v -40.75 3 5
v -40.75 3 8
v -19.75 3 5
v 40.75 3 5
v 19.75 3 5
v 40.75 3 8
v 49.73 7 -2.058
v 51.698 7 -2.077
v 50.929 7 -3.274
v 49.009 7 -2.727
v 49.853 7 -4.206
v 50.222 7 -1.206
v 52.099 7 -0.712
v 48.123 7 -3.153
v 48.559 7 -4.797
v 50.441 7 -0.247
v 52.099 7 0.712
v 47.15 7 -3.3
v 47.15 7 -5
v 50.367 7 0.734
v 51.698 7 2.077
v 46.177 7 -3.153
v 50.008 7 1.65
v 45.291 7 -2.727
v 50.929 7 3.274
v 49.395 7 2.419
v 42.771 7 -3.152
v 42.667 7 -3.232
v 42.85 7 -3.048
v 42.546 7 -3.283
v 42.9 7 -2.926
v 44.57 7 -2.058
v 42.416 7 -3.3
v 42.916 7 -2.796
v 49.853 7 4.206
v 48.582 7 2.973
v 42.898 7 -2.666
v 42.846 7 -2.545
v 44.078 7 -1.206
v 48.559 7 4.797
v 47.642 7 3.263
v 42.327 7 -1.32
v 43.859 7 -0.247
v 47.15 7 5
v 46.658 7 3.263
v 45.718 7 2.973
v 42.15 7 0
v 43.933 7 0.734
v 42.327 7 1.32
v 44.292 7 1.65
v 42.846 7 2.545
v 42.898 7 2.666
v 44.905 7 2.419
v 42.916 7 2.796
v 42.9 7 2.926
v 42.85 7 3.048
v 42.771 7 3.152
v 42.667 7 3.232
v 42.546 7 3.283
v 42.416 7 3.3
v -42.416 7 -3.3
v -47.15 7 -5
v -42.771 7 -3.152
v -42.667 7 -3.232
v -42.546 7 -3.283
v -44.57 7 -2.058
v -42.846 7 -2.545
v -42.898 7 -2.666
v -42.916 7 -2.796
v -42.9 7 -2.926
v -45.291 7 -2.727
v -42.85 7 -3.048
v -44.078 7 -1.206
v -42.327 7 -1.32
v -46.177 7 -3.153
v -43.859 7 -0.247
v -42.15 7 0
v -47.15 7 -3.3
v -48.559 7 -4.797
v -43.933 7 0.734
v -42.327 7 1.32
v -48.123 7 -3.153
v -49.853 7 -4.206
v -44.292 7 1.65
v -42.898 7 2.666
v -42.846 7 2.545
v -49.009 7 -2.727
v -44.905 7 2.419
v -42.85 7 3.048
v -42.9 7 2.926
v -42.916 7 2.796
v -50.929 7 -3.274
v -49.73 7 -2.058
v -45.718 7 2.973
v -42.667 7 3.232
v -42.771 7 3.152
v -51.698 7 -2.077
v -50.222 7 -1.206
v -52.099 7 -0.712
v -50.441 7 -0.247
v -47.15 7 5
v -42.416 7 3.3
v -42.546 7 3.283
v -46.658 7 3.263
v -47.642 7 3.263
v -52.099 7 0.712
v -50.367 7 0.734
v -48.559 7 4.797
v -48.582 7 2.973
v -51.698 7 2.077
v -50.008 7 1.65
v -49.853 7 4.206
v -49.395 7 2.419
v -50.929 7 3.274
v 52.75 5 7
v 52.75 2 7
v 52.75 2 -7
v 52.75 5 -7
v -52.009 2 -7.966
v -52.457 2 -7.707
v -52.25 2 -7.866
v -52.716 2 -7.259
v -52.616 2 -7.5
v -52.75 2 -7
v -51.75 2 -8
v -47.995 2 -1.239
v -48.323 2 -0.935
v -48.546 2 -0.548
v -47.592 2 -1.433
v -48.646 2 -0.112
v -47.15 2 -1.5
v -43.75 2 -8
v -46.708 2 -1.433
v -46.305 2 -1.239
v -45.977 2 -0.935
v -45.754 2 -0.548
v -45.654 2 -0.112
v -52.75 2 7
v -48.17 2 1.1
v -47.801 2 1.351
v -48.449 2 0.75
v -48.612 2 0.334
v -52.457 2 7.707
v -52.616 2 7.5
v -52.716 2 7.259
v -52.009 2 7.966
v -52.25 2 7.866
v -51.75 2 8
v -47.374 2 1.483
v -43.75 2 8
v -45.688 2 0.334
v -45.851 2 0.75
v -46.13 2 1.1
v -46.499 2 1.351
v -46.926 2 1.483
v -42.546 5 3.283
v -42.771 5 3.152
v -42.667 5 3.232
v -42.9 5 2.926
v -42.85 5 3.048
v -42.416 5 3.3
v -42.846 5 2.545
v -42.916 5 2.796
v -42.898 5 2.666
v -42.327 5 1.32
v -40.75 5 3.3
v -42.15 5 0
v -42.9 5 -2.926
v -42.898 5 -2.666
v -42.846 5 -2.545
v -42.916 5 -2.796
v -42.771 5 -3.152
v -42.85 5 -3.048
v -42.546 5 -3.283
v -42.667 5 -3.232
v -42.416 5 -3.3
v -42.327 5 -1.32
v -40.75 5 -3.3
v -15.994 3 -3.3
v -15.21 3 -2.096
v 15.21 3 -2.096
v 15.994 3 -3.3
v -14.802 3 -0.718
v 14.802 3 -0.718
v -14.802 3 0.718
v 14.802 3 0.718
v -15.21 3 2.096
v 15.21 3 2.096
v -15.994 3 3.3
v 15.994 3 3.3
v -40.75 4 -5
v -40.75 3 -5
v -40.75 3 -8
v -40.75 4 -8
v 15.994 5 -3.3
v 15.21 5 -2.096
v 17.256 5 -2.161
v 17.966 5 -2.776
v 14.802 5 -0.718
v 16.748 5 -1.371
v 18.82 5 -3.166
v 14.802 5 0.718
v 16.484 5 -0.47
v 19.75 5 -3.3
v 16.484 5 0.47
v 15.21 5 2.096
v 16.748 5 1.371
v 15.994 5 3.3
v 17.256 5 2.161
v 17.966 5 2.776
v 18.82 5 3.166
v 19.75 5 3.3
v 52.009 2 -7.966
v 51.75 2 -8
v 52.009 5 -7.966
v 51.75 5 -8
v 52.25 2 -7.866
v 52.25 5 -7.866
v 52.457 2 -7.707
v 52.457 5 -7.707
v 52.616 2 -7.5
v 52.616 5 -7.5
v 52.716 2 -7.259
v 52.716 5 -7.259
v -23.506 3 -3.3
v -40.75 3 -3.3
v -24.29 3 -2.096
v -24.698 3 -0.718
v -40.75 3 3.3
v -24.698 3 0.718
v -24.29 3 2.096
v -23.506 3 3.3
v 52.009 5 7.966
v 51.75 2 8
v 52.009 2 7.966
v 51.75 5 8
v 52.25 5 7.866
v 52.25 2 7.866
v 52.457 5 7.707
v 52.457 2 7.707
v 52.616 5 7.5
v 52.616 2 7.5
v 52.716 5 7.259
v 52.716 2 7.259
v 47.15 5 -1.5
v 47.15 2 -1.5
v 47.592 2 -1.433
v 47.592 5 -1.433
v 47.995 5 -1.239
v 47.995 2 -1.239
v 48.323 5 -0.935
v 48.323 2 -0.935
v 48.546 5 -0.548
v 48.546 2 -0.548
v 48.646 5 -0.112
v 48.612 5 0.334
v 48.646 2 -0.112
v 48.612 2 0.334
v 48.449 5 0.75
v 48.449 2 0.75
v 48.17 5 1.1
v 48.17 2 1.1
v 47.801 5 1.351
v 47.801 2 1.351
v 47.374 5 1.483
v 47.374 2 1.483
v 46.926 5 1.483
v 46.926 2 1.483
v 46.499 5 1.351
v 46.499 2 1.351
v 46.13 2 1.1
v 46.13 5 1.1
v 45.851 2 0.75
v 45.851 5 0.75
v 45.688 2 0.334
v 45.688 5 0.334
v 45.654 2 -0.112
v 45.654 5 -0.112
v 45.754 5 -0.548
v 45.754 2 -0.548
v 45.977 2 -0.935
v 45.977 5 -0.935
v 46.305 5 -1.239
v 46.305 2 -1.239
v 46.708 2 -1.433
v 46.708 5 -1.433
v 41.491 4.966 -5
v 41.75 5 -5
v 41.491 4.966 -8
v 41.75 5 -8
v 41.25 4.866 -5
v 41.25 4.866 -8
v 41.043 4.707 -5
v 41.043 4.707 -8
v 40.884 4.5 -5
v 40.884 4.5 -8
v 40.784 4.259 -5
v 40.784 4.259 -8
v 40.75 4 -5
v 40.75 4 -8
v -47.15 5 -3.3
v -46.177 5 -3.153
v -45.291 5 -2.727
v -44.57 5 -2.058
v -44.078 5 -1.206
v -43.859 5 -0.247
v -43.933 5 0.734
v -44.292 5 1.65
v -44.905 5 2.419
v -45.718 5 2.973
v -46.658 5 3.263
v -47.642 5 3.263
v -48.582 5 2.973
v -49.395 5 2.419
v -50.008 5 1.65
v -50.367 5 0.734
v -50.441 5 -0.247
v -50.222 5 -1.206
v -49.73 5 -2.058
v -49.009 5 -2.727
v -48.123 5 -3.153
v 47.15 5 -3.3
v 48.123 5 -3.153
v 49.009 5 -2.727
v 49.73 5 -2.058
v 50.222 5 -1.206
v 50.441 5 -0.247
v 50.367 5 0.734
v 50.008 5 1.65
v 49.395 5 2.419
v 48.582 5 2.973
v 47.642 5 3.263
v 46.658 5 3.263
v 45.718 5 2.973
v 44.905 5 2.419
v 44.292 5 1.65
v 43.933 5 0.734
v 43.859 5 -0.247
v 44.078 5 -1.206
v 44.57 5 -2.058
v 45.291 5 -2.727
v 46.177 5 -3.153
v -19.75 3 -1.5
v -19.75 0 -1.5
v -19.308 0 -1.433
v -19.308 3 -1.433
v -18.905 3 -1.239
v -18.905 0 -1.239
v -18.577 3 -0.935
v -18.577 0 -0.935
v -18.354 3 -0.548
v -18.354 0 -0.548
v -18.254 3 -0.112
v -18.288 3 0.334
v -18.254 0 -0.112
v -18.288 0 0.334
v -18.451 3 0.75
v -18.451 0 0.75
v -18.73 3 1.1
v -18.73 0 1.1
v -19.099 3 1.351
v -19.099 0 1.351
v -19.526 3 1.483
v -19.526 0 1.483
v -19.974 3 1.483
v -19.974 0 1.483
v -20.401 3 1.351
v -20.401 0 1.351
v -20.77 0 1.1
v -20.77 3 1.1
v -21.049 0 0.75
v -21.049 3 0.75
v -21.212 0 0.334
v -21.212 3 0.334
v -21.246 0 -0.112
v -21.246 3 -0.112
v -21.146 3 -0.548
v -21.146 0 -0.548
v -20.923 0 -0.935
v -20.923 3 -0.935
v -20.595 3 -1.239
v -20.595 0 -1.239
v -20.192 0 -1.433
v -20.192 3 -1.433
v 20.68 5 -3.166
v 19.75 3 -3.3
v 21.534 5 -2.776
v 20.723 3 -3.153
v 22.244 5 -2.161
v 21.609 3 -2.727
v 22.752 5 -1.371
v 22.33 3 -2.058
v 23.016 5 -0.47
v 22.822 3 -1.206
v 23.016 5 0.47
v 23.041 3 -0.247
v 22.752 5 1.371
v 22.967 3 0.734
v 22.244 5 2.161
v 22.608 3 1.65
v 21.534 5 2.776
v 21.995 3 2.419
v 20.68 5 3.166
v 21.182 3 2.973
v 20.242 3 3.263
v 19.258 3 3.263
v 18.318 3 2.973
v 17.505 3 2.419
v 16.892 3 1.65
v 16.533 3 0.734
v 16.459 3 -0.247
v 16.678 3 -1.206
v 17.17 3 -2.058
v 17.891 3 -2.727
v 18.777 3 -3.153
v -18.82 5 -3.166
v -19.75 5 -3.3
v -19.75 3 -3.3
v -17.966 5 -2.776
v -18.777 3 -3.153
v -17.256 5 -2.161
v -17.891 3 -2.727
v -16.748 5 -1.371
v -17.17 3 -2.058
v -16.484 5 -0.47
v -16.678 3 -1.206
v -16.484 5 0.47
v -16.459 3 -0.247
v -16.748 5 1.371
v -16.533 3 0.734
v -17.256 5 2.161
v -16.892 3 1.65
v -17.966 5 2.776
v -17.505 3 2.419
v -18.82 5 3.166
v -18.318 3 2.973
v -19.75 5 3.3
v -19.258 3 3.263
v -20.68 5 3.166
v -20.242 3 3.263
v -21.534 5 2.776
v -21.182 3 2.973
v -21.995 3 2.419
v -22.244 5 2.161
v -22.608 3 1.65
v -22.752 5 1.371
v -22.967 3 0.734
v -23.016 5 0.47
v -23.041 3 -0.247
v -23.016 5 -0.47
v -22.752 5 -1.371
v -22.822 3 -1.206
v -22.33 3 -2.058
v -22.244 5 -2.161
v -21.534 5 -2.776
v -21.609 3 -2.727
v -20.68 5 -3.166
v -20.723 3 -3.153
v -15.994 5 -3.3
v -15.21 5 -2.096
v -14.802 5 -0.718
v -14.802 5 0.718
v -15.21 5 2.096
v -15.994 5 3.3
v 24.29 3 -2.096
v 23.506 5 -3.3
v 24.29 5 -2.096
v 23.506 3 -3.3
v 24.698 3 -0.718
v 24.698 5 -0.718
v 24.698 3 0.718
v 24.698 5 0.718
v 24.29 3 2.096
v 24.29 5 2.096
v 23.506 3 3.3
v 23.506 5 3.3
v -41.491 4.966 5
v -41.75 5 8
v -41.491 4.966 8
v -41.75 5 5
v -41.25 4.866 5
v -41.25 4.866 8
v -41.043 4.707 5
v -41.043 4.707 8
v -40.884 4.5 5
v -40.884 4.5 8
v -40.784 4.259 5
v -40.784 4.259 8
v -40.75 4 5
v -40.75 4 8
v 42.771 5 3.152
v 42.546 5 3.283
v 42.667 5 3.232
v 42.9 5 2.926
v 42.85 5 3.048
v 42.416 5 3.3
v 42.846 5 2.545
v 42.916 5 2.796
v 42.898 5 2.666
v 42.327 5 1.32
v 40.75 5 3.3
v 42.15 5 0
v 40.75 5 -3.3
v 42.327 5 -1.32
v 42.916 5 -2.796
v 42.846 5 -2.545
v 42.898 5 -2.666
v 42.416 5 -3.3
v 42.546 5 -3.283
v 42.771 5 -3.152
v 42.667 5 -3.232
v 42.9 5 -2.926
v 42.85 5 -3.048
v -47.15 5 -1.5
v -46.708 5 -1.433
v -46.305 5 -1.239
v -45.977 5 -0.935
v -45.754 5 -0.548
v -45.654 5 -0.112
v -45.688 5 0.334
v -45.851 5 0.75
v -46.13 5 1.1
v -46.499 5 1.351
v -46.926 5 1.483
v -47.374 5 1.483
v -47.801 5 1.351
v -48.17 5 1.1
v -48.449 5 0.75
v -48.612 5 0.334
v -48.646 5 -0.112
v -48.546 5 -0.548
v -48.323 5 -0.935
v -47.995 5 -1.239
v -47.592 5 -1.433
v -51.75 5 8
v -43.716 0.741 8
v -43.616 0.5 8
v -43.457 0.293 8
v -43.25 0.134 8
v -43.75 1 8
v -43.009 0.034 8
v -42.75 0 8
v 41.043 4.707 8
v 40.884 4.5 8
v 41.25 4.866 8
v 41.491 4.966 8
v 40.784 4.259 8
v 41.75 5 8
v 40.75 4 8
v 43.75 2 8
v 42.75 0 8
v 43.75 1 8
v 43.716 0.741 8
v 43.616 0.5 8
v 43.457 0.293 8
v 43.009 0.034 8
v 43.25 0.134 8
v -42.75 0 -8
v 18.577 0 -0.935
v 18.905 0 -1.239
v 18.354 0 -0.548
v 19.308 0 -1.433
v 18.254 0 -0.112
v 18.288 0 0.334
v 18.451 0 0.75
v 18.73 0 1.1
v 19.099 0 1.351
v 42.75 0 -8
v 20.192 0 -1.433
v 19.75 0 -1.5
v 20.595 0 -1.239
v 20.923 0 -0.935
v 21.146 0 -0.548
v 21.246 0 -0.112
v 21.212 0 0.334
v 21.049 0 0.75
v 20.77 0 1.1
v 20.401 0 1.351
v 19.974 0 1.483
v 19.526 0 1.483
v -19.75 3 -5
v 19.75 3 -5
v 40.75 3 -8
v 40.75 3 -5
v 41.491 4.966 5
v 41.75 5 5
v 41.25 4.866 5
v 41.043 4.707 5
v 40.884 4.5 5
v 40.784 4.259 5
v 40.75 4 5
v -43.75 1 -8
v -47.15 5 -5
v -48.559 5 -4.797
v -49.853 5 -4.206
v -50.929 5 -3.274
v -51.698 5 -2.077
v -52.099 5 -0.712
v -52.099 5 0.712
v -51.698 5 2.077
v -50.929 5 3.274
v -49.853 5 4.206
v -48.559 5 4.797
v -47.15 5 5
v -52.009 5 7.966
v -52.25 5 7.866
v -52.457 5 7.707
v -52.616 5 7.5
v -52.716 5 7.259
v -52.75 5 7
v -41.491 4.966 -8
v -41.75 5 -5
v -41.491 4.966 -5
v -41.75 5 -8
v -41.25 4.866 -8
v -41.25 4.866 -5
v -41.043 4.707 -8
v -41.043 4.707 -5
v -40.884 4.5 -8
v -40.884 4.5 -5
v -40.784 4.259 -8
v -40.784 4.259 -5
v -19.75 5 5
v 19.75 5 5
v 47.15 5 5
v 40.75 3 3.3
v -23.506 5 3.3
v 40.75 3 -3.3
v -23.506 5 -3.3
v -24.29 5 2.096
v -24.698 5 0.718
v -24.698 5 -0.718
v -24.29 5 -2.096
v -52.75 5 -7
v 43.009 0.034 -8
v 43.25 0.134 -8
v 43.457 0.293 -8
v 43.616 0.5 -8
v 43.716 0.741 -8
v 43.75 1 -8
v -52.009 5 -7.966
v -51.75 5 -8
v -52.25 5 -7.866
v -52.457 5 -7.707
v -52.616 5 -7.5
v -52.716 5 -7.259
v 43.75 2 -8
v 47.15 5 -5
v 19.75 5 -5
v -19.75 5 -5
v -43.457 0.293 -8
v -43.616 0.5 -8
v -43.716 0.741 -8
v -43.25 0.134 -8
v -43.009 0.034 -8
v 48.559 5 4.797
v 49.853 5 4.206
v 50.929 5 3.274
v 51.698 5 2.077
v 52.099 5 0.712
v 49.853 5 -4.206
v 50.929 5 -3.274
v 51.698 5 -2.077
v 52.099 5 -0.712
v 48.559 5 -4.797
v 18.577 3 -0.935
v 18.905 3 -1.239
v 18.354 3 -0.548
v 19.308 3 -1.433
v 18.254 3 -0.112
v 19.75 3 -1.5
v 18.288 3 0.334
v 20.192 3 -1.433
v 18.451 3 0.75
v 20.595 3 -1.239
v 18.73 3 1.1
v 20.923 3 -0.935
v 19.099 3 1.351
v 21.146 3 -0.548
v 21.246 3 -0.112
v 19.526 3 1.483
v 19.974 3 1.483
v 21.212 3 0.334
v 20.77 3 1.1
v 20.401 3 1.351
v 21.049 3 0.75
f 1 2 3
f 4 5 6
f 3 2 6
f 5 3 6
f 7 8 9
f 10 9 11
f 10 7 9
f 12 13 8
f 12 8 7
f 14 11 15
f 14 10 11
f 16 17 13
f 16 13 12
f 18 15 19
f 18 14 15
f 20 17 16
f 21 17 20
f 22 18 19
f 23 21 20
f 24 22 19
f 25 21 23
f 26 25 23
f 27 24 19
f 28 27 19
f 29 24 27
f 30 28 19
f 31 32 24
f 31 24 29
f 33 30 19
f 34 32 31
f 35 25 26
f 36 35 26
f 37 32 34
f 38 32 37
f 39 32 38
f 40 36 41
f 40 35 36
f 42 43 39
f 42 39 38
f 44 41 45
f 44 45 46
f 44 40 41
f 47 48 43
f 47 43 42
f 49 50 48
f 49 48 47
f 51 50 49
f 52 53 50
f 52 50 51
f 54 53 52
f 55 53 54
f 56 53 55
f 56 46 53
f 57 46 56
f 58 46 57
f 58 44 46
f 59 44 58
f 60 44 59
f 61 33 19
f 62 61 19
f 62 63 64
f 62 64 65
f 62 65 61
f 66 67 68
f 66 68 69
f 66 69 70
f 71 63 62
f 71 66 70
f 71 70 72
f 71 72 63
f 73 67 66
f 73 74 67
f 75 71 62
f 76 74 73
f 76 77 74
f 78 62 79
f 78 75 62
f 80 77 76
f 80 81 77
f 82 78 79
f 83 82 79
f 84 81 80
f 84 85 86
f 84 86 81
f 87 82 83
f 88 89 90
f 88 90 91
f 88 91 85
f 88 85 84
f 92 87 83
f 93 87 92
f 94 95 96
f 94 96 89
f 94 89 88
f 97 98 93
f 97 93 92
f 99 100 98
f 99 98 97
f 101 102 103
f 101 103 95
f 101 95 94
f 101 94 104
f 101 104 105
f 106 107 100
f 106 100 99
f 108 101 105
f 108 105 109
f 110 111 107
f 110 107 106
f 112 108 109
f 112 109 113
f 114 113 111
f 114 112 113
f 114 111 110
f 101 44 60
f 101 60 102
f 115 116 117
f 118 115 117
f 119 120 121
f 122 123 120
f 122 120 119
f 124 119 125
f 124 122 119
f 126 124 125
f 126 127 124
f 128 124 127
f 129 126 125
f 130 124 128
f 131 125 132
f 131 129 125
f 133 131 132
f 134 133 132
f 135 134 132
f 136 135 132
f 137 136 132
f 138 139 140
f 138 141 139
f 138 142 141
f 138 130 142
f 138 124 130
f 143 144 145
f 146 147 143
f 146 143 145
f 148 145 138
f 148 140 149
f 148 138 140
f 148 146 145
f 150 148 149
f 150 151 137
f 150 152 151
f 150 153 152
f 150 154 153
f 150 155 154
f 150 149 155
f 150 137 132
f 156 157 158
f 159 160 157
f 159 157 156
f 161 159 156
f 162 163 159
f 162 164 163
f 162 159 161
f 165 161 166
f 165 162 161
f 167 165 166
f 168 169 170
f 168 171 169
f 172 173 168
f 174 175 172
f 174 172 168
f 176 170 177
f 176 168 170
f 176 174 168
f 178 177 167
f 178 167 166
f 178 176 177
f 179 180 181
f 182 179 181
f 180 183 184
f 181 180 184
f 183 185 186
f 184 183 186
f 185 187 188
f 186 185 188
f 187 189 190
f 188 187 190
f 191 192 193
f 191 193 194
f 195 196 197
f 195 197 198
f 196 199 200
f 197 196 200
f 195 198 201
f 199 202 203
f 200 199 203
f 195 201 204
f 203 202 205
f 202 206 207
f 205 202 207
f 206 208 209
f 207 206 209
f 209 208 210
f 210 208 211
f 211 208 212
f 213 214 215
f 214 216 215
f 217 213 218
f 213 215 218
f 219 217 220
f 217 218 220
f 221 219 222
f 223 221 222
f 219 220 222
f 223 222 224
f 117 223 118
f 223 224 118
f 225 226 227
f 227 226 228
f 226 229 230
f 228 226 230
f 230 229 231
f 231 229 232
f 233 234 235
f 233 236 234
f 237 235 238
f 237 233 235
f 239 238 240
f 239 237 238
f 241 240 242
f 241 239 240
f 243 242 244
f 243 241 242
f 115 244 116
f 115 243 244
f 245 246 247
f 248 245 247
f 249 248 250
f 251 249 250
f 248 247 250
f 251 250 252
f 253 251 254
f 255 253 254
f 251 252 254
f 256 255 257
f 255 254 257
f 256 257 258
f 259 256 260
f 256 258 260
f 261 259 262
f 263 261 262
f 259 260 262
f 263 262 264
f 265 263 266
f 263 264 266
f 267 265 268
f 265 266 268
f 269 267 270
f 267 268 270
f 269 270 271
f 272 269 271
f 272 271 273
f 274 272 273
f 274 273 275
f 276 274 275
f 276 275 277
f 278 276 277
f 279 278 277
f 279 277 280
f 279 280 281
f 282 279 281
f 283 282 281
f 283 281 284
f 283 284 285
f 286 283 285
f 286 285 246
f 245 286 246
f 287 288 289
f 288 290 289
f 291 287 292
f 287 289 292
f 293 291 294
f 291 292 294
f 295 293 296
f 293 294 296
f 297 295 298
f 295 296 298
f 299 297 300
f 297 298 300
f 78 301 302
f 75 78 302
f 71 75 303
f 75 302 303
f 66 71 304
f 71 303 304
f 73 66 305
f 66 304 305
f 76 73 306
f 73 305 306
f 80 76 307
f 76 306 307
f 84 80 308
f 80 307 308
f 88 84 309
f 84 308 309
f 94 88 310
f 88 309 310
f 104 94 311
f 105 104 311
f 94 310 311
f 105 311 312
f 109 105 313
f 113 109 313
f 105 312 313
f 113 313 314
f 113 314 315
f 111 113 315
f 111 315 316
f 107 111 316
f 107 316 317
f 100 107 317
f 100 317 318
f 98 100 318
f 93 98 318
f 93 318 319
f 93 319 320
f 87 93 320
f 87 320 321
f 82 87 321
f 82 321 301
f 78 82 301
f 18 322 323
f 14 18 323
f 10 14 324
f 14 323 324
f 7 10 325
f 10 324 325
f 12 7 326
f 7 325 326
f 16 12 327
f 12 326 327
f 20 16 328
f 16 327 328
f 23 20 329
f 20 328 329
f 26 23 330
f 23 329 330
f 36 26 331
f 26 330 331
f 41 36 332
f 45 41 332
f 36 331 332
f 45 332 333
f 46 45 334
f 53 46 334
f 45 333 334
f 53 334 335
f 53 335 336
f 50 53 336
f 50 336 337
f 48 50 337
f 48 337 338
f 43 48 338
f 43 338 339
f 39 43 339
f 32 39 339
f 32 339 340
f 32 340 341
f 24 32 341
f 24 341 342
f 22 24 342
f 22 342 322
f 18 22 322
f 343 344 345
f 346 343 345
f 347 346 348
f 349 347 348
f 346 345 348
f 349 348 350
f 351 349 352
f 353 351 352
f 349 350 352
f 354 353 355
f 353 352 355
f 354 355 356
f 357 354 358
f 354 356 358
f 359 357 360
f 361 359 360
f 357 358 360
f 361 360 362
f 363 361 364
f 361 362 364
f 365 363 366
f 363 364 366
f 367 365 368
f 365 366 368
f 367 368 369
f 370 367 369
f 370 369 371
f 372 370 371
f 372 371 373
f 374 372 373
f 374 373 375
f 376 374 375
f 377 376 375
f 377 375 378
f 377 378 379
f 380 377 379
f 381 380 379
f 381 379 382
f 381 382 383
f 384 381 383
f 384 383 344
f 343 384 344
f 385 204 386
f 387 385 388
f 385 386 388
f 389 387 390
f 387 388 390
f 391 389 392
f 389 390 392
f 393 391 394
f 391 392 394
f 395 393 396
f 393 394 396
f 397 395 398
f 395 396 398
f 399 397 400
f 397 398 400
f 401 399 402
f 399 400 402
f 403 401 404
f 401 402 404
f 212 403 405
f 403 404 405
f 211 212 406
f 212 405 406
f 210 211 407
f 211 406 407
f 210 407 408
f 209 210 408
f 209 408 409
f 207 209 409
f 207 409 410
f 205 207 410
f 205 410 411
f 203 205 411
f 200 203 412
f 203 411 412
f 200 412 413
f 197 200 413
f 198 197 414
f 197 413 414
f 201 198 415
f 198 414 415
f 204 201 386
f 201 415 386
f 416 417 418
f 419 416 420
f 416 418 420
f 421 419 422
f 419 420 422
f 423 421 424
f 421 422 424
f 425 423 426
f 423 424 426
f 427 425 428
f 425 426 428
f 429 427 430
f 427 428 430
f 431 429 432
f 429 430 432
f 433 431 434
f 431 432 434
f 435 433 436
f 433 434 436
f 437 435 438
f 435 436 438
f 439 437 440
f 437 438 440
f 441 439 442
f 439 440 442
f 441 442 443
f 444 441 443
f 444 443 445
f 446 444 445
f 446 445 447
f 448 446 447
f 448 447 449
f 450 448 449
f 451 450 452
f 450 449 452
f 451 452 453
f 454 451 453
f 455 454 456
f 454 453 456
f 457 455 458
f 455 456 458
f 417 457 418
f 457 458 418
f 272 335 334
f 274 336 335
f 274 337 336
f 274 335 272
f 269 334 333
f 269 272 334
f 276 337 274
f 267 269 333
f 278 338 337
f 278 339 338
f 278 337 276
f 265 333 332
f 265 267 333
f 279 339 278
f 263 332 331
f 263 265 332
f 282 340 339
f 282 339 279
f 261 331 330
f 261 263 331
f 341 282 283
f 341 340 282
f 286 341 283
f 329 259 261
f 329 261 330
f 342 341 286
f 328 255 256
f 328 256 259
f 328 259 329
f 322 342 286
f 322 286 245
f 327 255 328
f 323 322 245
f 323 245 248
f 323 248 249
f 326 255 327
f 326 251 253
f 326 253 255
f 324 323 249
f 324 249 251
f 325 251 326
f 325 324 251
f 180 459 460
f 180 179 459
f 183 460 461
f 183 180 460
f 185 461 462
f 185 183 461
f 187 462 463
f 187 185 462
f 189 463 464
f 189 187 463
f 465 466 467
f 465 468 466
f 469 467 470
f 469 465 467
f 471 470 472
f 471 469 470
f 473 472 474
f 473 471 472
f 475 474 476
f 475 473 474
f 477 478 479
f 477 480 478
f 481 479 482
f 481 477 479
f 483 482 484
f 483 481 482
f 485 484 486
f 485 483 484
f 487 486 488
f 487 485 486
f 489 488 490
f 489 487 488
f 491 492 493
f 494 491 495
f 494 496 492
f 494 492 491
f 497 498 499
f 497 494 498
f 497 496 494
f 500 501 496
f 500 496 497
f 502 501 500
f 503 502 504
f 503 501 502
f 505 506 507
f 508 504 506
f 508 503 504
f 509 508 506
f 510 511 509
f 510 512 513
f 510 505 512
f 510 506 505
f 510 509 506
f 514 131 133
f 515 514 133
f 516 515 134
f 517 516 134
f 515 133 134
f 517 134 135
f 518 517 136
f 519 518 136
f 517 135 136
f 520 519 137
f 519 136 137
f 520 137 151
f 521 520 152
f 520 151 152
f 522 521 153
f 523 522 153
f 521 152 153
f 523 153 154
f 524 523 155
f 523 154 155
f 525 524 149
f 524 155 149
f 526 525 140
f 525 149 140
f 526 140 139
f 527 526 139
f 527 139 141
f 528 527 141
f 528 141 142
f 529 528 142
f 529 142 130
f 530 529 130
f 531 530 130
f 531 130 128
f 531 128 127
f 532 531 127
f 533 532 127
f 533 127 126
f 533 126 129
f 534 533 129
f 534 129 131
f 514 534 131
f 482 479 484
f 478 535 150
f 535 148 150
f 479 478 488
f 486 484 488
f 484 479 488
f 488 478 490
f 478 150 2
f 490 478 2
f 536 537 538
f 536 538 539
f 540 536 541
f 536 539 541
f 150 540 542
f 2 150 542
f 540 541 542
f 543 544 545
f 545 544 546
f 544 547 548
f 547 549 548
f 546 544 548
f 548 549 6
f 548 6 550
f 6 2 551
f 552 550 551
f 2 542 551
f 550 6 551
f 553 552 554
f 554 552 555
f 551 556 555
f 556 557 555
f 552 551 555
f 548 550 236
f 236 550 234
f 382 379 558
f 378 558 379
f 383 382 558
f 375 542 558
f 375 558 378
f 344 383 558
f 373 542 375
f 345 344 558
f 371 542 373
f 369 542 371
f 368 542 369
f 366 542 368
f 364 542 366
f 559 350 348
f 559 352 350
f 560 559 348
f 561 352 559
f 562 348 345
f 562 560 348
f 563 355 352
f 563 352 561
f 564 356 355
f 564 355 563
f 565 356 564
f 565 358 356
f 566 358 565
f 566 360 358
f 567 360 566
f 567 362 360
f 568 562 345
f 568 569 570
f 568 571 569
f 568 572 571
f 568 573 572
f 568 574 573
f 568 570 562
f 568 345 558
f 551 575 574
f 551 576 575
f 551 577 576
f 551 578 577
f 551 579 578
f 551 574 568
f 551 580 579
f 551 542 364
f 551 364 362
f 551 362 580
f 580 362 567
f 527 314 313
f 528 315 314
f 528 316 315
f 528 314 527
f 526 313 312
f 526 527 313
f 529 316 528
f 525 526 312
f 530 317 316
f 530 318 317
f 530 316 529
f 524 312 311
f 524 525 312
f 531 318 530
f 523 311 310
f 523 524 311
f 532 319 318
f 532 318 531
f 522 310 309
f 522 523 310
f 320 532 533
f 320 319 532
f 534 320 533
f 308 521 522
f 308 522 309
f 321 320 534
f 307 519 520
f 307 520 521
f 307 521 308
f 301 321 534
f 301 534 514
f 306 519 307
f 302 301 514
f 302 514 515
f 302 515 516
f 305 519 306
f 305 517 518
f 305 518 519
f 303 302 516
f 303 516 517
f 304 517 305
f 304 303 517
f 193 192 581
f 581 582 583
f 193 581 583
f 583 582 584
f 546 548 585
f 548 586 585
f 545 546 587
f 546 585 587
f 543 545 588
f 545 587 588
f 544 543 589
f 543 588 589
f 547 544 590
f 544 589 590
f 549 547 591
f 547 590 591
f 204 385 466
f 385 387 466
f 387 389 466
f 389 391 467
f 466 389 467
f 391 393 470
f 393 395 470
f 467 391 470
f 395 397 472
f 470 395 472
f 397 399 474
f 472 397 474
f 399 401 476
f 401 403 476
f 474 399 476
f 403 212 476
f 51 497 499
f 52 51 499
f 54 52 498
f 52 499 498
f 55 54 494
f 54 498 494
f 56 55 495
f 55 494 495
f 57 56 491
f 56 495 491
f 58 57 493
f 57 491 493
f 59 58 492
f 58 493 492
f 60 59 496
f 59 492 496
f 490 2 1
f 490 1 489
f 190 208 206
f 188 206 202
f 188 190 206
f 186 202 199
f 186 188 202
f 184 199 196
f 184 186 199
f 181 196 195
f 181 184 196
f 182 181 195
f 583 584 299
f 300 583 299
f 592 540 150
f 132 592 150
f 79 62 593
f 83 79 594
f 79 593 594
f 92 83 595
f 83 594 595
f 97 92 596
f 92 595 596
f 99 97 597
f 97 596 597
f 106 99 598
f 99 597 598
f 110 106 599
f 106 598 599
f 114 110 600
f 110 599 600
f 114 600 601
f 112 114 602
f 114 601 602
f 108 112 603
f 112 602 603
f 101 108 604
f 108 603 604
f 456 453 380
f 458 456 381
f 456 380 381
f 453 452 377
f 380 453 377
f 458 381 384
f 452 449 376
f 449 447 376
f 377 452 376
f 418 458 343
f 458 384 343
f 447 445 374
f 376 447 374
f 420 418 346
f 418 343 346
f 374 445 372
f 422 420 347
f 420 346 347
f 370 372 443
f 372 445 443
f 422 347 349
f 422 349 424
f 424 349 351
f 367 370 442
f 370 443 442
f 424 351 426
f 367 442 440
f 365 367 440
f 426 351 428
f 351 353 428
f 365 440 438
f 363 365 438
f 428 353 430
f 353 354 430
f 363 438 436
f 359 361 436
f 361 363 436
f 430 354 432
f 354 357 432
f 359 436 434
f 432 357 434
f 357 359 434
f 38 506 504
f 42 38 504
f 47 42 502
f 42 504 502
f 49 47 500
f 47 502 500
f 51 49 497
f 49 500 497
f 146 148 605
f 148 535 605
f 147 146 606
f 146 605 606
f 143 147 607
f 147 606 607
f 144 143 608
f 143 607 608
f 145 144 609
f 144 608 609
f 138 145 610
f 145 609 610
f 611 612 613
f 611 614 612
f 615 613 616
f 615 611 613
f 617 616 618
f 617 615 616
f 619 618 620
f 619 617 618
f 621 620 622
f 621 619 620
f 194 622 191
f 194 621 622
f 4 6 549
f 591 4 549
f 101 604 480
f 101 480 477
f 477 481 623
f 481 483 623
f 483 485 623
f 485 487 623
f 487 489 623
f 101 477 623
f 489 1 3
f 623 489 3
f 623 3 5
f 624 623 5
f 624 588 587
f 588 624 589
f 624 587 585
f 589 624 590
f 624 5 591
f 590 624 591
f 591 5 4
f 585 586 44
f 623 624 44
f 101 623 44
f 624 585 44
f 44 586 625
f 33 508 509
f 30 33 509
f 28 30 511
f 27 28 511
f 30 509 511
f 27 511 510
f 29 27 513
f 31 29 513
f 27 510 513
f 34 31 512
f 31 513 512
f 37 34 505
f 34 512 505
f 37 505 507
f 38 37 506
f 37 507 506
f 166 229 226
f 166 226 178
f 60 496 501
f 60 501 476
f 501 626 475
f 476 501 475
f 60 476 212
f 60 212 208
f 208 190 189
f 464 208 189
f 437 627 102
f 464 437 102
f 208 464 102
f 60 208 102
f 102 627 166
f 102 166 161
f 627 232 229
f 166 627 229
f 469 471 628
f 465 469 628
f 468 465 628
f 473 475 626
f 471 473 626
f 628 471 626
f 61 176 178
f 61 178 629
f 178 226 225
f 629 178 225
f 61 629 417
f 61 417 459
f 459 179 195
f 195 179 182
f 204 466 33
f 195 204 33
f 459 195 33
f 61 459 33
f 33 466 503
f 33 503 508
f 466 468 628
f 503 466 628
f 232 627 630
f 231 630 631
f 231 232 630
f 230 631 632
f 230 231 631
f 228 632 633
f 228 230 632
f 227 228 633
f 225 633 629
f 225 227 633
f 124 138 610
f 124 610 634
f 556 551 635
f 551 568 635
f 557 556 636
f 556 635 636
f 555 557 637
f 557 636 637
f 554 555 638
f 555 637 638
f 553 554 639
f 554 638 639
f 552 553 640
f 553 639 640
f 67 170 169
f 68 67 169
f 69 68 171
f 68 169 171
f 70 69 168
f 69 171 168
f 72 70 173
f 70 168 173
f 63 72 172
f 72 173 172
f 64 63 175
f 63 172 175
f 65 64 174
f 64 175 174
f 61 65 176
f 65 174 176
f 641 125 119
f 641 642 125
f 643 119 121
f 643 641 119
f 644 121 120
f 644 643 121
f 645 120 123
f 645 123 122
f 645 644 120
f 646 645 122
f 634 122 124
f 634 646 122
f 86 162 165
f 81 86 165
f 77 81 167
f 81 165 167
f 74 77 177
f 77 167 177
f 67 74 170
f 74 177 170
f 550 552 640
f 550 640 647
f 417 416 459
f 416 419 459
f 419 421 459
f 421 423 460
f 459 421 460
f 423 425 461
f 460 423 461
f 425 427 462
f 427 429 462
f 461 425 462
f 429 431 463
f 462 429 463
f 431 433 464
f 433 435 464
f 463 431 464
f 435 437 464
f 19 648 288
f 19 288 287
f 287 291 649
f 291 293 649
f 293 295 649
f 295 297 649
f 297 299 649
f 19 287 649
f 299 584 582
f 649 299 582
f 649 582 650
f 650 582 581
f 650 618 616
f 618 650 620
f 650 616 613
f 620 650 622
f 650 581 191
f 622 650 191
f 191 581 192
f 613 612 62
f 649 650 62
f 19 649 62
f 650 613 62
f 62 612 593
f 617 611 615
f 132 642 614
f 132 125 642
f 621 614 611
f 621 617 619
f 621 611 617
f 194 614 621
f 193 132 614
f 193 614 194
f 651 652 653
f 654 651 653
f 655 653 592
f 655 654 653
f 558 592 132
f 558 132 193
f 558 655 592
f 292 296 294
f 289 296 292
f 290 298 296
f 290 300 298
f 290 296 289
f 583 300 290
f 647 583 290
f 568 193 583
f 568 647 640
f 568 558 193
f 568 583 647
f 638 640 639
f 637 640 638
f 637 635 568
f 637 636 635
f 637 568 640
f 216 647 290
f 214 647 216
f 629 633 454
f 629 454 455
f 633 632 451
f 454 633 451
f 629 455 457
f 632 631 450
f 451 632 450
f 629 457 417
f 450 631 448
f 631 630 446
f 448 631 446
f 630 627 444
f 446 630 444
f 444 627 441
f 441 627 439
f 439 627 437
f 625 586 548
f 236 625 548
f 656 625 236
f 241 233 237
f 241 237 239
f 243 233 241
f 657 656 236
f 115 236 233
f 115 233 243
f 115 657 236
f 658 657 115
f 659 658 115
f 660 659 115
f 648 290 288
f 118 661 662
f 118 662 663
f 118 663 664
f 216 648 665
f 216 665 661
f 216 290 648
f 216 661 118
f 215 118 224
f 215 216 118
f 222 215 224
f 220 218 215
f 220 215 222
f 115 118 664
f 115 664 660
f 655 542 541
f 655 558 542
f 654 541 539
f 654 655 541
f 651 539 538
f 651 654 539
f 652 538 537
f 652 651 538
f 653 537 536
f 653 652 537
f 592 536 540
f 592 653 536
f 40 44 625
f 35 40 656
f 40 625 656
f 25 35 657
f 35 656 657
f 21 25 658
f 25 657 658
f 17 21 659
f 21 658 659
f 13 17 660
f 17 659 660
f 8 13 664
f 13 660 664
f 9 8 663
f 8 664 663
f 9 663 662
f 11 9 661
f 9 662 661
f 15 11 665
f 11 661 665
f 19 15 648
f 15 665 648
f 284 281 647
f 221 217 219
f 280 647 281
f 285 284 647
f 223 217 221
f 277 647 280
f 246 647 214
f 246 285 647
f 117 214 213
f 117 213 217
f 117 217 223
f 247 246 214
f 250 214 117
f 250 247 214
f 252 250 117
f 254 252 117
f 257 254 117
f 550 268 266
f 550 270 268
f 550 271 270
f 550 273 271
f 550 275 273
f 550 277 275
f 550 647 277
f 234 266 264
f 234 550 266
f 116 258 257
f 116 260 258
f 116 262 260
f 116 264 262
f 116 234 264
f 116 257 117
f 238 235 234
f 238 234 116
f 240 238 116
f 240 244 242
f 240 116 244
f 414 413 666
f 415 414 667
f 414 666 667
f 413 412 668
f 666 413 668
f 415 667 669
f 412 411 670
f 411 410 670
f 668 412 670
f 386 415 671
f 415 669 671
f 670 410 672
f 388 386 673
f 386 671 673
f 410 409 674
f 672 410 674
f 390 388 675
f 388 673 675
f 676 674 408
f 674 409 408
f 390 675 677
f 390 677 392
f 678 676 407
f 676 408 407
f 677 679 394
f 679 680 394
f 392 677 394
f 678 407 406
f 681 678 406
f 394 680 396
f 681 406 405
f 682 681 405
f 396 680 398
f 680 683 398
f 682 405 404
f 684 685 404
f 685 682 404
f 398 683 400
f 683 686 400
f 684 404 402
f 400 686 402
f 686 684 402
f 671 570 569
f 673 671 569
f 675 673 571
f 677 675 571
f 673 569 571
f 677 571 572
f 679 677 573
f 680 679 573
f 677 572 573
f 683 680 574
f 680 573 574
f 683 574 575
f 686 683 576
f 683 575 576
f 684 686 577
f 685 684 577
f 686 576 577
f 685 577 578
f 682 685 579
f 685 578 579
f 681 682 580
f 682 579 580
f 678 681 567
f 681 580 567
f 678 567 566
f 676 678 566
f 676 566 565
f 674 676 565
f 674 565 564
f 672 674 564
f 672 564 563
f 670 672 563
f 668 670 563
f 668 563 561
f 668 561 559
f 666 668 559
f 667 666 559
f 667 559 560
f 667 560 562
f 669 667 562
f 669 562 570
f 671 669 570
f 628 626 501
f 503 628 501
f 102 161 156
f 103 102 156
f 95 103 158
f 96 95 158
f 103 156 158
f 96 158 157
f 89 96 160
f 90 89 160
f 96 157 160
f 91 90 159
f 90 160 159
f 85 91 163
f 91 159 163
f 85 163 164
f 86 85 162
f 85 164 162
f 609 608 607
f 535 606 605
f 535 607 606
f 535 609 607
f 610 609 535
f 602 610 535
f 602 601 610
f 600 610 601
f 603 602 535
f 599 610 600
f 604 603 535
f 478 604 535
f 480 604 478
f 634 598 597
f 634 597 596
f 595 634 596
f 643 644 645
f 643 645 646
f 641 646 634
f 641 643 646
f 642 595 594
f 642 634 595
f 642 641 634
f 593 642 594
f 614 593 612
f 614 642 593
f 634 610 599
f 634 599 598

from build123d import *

# Parameters (mm, degrees)
SKETCH_1_W          = 105.5
SKETCH_1_H          = 16
EXTRUDE_1_DEPTH     = 5
SKETCH_2_W          = 81.5
SKETCH_2_H          = 2
CUT_EXTRUDE_1_DEPTH = 16
SKETCH_5_R          = 1.5
CUT_EXTRUDE_2_DEPTH = 5
SKETCH_6_R          = 3.3
EXTRUDE_3_DEPTH     = 7
SKETCH_7_R          = 5
SKETCH_7_R_2        = 3.3
EXTRUDE_4_DEPTH     = 5
SKETCH_8_W          = 9
SKETCH_8_H          = 2
CUT_EXTRUDE_3_DEPTH = 16
FILLET_1_R          = 1
FILLET_2_R          = 1


with BuildPart() as part:
    # 草图1 → 凸台-拉伸1 (new body)
    with BuildSketch(Plane(origin=(0, 0, 0), x_dir=(1, 0, 0), z_dir=(0, 1, 0))):
        Rectangle(SKETCH_1_W, SKETCH_1_H)
    extrude(amount=EXTRUDE_1_DEPTH)

    # 草图2 → 切除-拉伸1 (cut)
    with BuildSketch(Plane.XY.offset(8)):
        with Locations((0, 4)):
            Rectangle(SKETCH_2_W, SKETCH_2_H)
    extrude(amount=-CUT_EXTRUDE_1_DEPTH, mode=Mode.SUBTRACT)

    # 草图5 → 切除-拉伸2 (cut)
    with BuildSketch(Plane.XZ):
        with Locations(Location((-47.15, 0, 0), (0, 0, 270))):
            Circle(SKETCH_5_R)
        with Locations(Location((47.15, 0, 0), (0, 0, 270))):
            Circle(SKETCH_5_R)
        with Locations(Location((-19.75, 0, 0), (0, 0, 270))):
            Circle(SKETCH_5_R)
        with Locations(Location((19.75, 0, 0), (0, 0, 270))):
            Circle(SKETCH_5_R)
    extrude(amount=-CUT_EXTRUDE_2_DEPTH, mode=Mode.SUBTRACT)

    # 草图6 → 凸台-拉伸3 (add)
    with BuildSketch(Plane.XZ):
        with BuildLine():
            Line((-47.15, 5), (47.15, 5))
            ThreePointArc((47.15, 5), (52.15, 0), (47.15, -5))
            Line((47.15, -5), (-47.15, -5))
            ThreePointArc((-47.15, -5), (-52.15, 0), (-47.15, 5))
        make_face()
        with Locations(Location((-47.15, 0, 0), (0, 0, 270))):
            Circle(SKETCH_6_R, mode=Mode.SUBTRACT)
        with Locations(Location((47.15, 0, 0), (0, 0, 270))):
            Circle(SKETCH_6_R, mode=Mode.SUBTRACT)
        with BuildLine():
            ThreePointArc((42.846436226, 2.545454545), (42.850402728, 3.047716847), (42.416079849, 3.3))
            Line((42.416079849, 3.3), (-42.416079849, 3.3))
            ThreePointArc((-42.416079849, 3.3), (-42.850402728, 3.047716847), (-42.846436226, 2.545454545))
            ThreePointArc((-42.846436226, 2.545454545), (-42.15, 0), (-42.846436226, -2.545454545))
            ThreePointArc((-42.846436226, -2.545454545), (-42.850402728, -3.047716847), (-42.416079849, -3.3))
            Line((-42.416079849, -3.3), (42.416079849, -3.3))
            ThreePointArc((42.416079849, -3.3), (42.850402728, -3.047716847), (42.846436226, -2.545454545))
            ThreePointArc((42.846436226, -2.545454545), (42.15, 0), (42.846436226, 2.545454545))
        make_face(mode=Mode.SUBTRACT)
    extrude(amount=-EXTRUDE_3_DEPTH)

    # 草图7 → 凸台-拉伸4 (add)
    # profile 1 of 2: a face of its own
    with BuildSketch(Plane.XZ):
        with Locations((-19.75, 0)):
            Circle(SKETCH_7_R)
        with Locations(Location((-19.75, 0, 0), (0, 0, 270))):
            Circle(SKETCH_7_R_2, mode=Mode.SUBTRACT)
    # profile 2 of 2: a face of its own
    with BuildSketch(Plane.XZ):
        with Locations((19.75, 0)):
            Circle(SKETCH_7_R)
        with Locations(Location((19.75, 0, 0), (0, 0, 270))):
            Circle(SKETCH_7_R_2, mode=Mode.SUBTRACT)
    extrude(amount=-EXTRUDE_4_DEPTH)

    # 草图8 → 切除-拉伸3 (cut)
    with BuildSketch(Plane.XY.offset(8)):
        with Locations((-48.25, 1)):
            Rectangle(SKETCH_8_W, SKETCH_8_H)
        with Locations((48.25, 1)):
            Rectangle(SKETCH_8_W, SKETCH_8_H)
    extrude(amount=-CUT_EXTRUDE_3_DEPTH, mode=Mode.SUBTRACT)

    # 圆角1
    fillet_1_edges = [part.edges().sort_by_distance(p)[0] for p in [
        (-43.75, 0, 0),
        (43.75, 0, 0),
        (52.75, 3.5, 8),
        (-52.75, 3.5, 8),
        (-52.75, 3.5, -8),
        (52.75, 3.5, -8),
    ]]
    fillet(fillet_1_edges, radius=FILLET_1_R)

    # 圆角2
    fillet_2_edges = [part.edges().sort_by_distance(p)[0] for p in [
        (40.75, 5, -6.5),
        (-40.75, 5, -6.5),
        (-40.75, 5, 6.5),
        (40.75, 5, 6.5),
    ]]
    fillet(fillet_2_edges, radius=FILLET_2_R)


solid = part.part
